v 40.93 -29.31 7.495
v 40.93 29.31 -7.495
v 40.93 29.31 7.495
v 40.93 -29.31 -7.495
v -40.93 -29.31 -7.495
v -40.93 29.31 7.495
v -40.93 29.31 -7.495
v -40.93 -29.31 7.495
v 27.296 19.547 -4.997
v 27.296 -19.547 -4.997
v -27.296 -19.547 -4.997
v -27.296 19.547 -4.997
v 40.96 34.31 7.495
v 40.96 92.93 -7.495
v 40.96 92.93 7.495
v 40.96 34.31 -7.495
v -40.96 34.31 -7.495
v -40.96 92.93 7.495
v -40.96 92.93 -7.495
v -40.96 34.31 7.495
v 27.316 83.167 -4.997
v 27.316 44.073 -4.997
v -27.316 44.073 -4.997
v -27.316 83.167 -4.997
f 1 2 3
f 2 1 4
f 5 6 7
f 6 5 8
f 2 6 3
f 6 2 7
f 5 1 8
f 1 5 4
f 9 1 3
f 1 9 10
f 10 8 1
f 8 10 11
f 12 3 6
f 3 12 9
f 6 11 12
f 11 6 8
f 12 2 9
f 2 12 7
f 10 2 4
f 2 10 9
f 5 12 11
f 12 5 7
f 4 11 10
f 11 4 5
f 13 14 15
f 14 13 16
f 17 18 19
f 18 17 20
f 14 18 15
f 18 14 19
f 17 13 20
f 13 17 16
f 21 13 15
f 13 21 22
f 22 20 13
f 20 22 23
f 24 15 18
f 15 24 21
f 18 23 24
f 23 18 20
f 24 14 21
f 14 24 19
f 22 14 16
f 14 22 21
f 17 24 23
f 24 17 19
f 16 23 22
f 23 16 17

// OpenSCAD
// file: doubleTaperBox.scad
// makes a double ended tapered cube.

module taper_cube(  big = [10, 20], 
                    small = [3, 6], 
                    height=15, 
                    indent_pct=10)
{
    difference()
    {
        cube ([ big.x, big.y, height],center=true);
        
        translate([0, 0, height/2])
        union ()
        {
            hull()
            {
                cube([ big.x, big.y, .01],center=true);
                translate([ 0, 0, -height])
                cube ([ small.x, small.y, .01],center=true);
            }
        }

        indent = height * indent_pct/100;
        translate([0, 0, -height/2 + indent])
        union ()
        {
            #hull()
            {
                cube ([ small.x, small.y, .01],center=true);
                translate([ 0, 0, -indent])
                cube([ big.x, big.y, .01],center=true);
            }
        }

    }
}


//make_bar(10);
//make_drip([ 3*25.4 , 2*25.4]);
taper_cube(indent_pct=30);
// file: myTools-extended.scad
$fn = $preview ? 50 : 120;
//=================================================

//            W   D   H   TRANS         ROTATE  btm top               
cylinder1 = [ +3, 20, 30, [0,0,0], [0,0,0],  0, 1 ]; // dia, len, translate[x,y,z]

// W=0 solid cylinder
cylinderX = [ 0, 20, 30, [0,40,0], [0,0,0],  0, 1 ]; // dia, len, translate[x,y,z]

//cylinder1 = [ +3, 20, 30, [0,0,0],      [0,0,0],  0, 0 ]; // dia, len, translate[x,y,z]
cylinder2 = [ -3, 20, 30, [0,40,0],     [0,0,0],  0, 1 ]; // dia, len, translate[x,y,z]

//cylinder2 = [ 4, 20, 30, [100,0,10/2], [0,0,0],   1, 0 ]; // dia, len, translate[x,y,z]
cylinder3 = [ 3, 55, 66, [-30,0,0],    [0,0,0],   0, 1 ]; // dia, len, translate[x,y,z]
cylinder4 = [ 3, 20, 30, [-100,0,10/2],[0,-90,0], 0, 1 ]; // dia, len, translate[x,y,z]

cylinder5 = [ 3, 55, 66, [ 0,30,0],     [0,0,0],   1, 0 ]; // dia, len, translate[x,y,z]

cylinder7 = [ 3, 20, 30, [ 0,100, 10/2],[0,-90,0], 1, 0 ]; // dia, len, translate[x,y,z]
cylinder8 = [ 3, 55, 66, [ 0,-30,0],    [0,0,0],   0, 1 ]; // dia, len, translate[x,y,z]
cylinder9 = [ 3, 30, [ 0,-100,10/2],[0,-90,0], 0, 1 ]; // dia, len, translate[x,y,z]

//       thick     dims           trans       rotate    left, right
box1 = [  3, [ 10, 20, 30] , [  30, 0, 0 ], [ 0, 0, 0 ],  0, 0];
box2 = [ -3, [ 10, 20, 30] , [  45, 0, 0 ], [ 0, 0, 0 ],  1, 0];
box3 = [ -3, [ 10, 20, 30] , [  60, 0, 0 ], [ 0, 0, 0 ],  0, 1];
box4 = [  3, [ 10, 20, 30] , [   0, 0, 0 ], [ 0, 0, 0 ],  1, 1];
// thick = 0 make solid
boxX = [  0, [ 10, 20, 30] , [  45, 0, 0 ], [ 0, 0, 0 ],  1, 0];


CYLINDER_LIST =[cylinder1, cylinderX];//, cylinder2];// [cylinder1, cylinder2]; //, cylinder3, cylinder4, cylinder5, cylinder6, cylinder7, cylinder8 ]; 
BOX_LIST=[boxX];
//, box2, box3]; //, box2, box3, box4]; //, box2];

module make_cubes(action, PARTS_LIST)
{
    BOX_THICK=0;
    BOX_DIMS=1;
    BOX_TRANS=2;
    BOX_ROTATE=3;
    BOX_ENDCAP_L=4;
    BOX_ENDCAP_R=5;
    
    echo ("DOIT (make_cubes): ", action);
        
    num_items =  len(PARTS_LIST);
    
    if (num_items)
    {
        if (action == "BOM")
        {
            // for each work object, execute the cmd on the object
            // the command is specified on the line after this BOM caller
            for(i=[0:1:$children-1])
               children(i); // do the shapes that come after us!
        }
        
        else if (action == "ADD")
        {
            echo ("start add cubes ------------------");
            for ( item = [ 0: num_items -1 ])
            {
                echo ("add item ", item);
                THICK = PARTS_LIST[item][BOX_THICK] * 2;
                GLP1 = [ THICK, THICK , 0];  // z walls done later.
                
                // thick > 0 dims = inside dimension ... add walls on ADD
                // thick < 0 dims = outside dimension ... just use dim
                CUBE = (THICK > 0) ? PARTS_LIST[item][BOX_DIMS] + GLP1 
                                   : PARTS_LIST[item][BOX_DIMS];
                
                echo ("item = ", item);
                echo ("usr dim = ", PARTS_LIST[item][BOX_DIMS]);
                echo ("wall thick = ", THICK/2);
                echo ("new dims = ", CUBE);
                
                translate( PARTS_LIST[item][BOX_TRANS])
                rotate( PARTS_LIST[item][BOX_ROTATE]) // user override
     
                // if WIDTH>0 walls grow outwards from DIM
                if ($preview)
                    %cube( CUBE, center=true);
                else
                    cube( CUBE, center=true);
            }

            echo ("end add cubes ------------------");
            echo ("");
        }
        else if (action == "REMOVE")
        {
            echo ("start removing cubes ------------------");

            num_items =  len(PARTS_LIST)-1;
            for ( item = [ 0: num_items ])
            {
               echo ("remove cube ", item);

                THICK = PARTS_LIST[item][BOX_THICK];
                if (THICK)
                {
                    GLP1 = [ THICK *2 , THICK*2 , 0];  // z walls done later.

                    //thick < 0 dims = outside dimension ... make walls
                    //thick > 0 dims = inside dimension of hole
                    CUBE = PARTS_LIST[item][BOX_DIMS]; 
                   
                    newW = (PARTS_LIST[item][BOX_ENDCAP_L] + PARTS_LIST[item][BOX_ENDCAP_R]) * THICK;

                    echo ("item = ", item);
                    echo ("endcapL = ",PARTS_LIST[item][BOX_ENDCAP_L]);
                    echo ("endcapR = ",PARTS_LIST[item][BOX_ENDCAP_R]);
                    echo ("newW = ", newW);
                   
                    // div 2, we are working with centered items.
                    punch = ((PARTS_LIST[item][BOX_ENDCAP_R] - PARTS_LIST[item][BOX_ENDCAP_L]) * THICK);
                    echo ("punch = ", punch);

                    // thick>0 wall grows out from DIM 
                    // thick<0 wall grow in from dim. 
                    A_CUBE = (THICK > 0) ? CUBE : CUBE + GLP1;
                    
                    //NEW_CUBE = A_CUBE;
                    NEW_CUBE = [ A_CUBE.x, A_CUBE.y, (punch ==0) ? A_CUBE.z: A_CUBE.z - abs(punch/4)];
                                 
                    echo ("remove: usr dims = ", PARTS_LIST[item][BOX_DIMS]);
                    echo ("remove: final dims = ", NEW_CUBE);   
                        
                    if ($preview)
                    {
                        // apply encap walls 
                        translate ([ 0, 0, -punch/4,]) // remember were on center /2 

                        // now do user PARTS_LIST
                        translate( PARTS_LIST[item][BOX_TRANS])
                        rotate( PARTS_LIST[item][BOX_ROTATE]) // user override
                        
                        #cube( [NEW_CUBE.x, 
                                NEW_CUBE.y,
                                NEW_CUBE.z],
                               center=true);
                    }
                    else
                    {
                        // apply encap walls 
                        translate ([ 0, 0, punch/4]) // remember were on center /2 

                        // now do user PARTS_LIST
                        translate( PARTS_LIST[item][BOX_TRANS])
                        rotate( PARTS_LIST[item][BOX_ROTATE]) // user override
                        
                        cube( [NEW_CUBE.x, 
                                NEW_CUBE.y,
                                NEW_CUBE.z],
                               center=true);
                    }
                }
                else
                {
                    echo ("THICK=0 object will be solid");
                }
            }
            echo ("end remove cubes ------------------");
        }
        else
            assert(0);   
    }
    else
    {
        echo ("NOTE: (make_cubes) no parts in parts list");
    }
    
}
//---------------------------------------------------------------------------    
module make_cylinders(action, PARTS_LIST)
{

//            D   H   TRANS         ROTATE   endcap endcap               
    CYL_THICK=0;
    CYL_DIA=1;
    CYL_HEIGHT=2;
    CYL_TRANS=3;
    CYL_ROTATE=4;
    CYL_ENDCAPL=5;
    CYL_ENDCAPR=6;

    echo ("DOIT (make_cylinders): ", action);
    
    num_items =  len(PARTS_LIST);
    if (num_items > 0)
    {
        if (action == "BOM")
        {
            // for each work object, execute the cmd on the object
            // the command is specified on the line after this PARTS_LIST caller
            for(i=[0:1:$children-1])
               children(i); // do the shapes that come after us!
        }
        
        else if (action == "ADD")
        {
            echo ("start add cylinders ------------------");
            for ( item = [ 0: num_items-1])
            {
                echo ("");
                echo ("add item ", item);
                THICK = PARTS_LIST[item][CYL_THICK];  // diameter speak.
                DIA = PARTS_LIST[item][CYL_DIA];

                newDIA = (THICK > 0) ? DIA + THICK*2 : DIA;
 
                height =  PARTS_LIST[item][CYL_HEIGHT];
                echo ("height = ", PARTS_LIST[item][CYL_HEIGHT]);
                echo ("thick = ", THICK);
                echo ("usr dia = ", PARTS_LIST[item][CYL_DIA]);
                echo ("newDIA = ", newDIA);

                translate( PARTS_LIST[item][CYL_TRANS])
                rotate( PARTS_LIST[item][CYL_ROTATE]) // user override
                #cylinder( d= newDIA, h = height, center=true);
                
            }
            echo ("----- end adding cylinders ------");
            echo ("");
        }
        else if (action == "REMOVE")
        {
            // make remove surface visable when previewing
            DEBUG = $preview ? 1 : 0;
            
            echo ("start remove cylinders ------------------");
            num_items =  len(PARTS_LIST)-1;
            for ( item = [ 0: num_items ])
            {
               echo ("remove cylinder -------- #", item);
             
               THICK = PARTS_LIST[item][CYL_THICK];  // diameter speak.
               if (THICK)
                {
                    echo ("item = ", item);
                    echo ("endcapL = ",PARTS_LIST[item][CYL_ENDCAPL]);
                    echo ("endcapR = ",PARTS_LIST[item][CYL_ENDCAPR]);

                   // reduce height when punching by the wall thickness of each endcap
                    height = DEBUG * .01 + PARTS_LIST[item][CYL_HEIGHT]
                             - (PARTS_LIST[item][CYL_ENDCAPL] + PARTS_LIST[item][CYL_ENDCAPR]) * abs(THICK);
                    echo ("orig H = ", PARTS_LIST[item][CYL_HEIGHT]);
                    echo ("new H = ", height);
                   
                    punch = (PARTS_LIST[item][CYL_ENDCAPL] - PARTS_LIST[item][CYL_ENDCAPR])* THICK/2;
                    echo ("punch = ", punch,"\n");
                 

                    echo ("THICK = ", THICK);
                    echo ("DIA = ", PARTS_LIST[item][CYL_DIA]);
                    newDIA = (THICK > 0) ? PARTS_LIST[item][CYL_DIA]: PARTS_LIST[item][CYL_DIA] + THICK*2;
                    echo ("newDIA = ", newDIA);
                    
                    if ($preview)
                    {
                        // apply encap walls 
                        translate ([ 0, 0, -punch]) // remember were on center /2 

                        // now do user PARTS_LIST
                        translate( PARTS_LIST[item][CYL_TRANS])
                        rotate( PARTS_LIST[item][CYL_ROTATE]) // user override
                        
                        %cylinder( d= newDIA, h = height, center=true);
                    }
                    else
                    {
                        // apply encap walls 
                        translate ([ 0, 0, -punch]) // remember were on center /2 

                        // now do user PARTS_LIST
                        translate( PARTS_LIST[item][CYL_TRANS])
                        rotate( PARTS_LIST[item][CYL_ROTATE]) // user override
                        
                        cylinder( d= newDIA, h = height, center=true);
                    }
                }
                else
                {
                    echo ("THICK = 0 object will be solid");
                }
                
            }
            echo ("----- end removing cylinders ------\n");
        }
        else
            assert(0);   
    }
    else
    {
        echo ("NOTE: (make_cylinders) no parts in parts list");
    }
       
}
//77777777777777777777777777


//------------------------------------------------------------
module testx()
{
    difference()
    {
        union()
        {
            make_cubes("BOM", PARTS_LIST=BOX_LIST)
              make_cubes("ADD", PARTS_LIST=BOX_LIST);
              
            make_cylinders("BOM", PARTS_LIST=CYLINDER_LIST)
              make_cylinders("ADD", PARTS_LIST=CYLINDER_LIST);
        }
        
        union()
        {
          make_cubes("BOM", PARTS_LIST=BOX_LIST)
            make_cubes("REMOVE", PARTS_LIST=BOX_LIST);
            
          make_cylinders("BOM", PARTS_LIST=CYLINDER_LIST)
            make_cylinders("REMOVE", PARTS_LIST=CYLINDER_LIST);
          
          // cutaway view
          translate([0,0,-50]) cube([100,100,100]);
        }
    } 
}

testx();
// main file
use <myTools-extended.scad>
use <doubleTaperBox.scad>

$fn = $preview ? 50 : 120;

//DEBUG= $preview ? 0 : 1;
DEBUG= 1;
//=================================================

TWEAK = 1;
WHITE_W = 80.86 + TWEAK;
WHITE_L = 57.62 + TWEAK;

BLACK_W = 80.92 + TWEAK;
BLACK_L = 57.62 + TWEAK;

THICK=4;
PIPE_LEN = 9 * 25.4;
BOX_LEN = 6 * 25.4;

A = WHITE_W * WHITE_L; //square inches of down pipe

TRUE_DIA = (2 * sqrt( A /PI));
PIPE_iDIA = round( TRUE_DIA + 10);  // round up to nearest 10mm

//ringSupport
RING_HEIGHT=10;
RING_WIDTH=20;

echo ("pipe AREA = ", A, "sq mm");
echo ("pipe PIPE_iDIA = ", PIPE_iDIA,"mm");

SCREW_DIA= 3/16 * 25.4;

function AVG(a,b) = (a+b)/2;

//              T         D           H           TRANS     ROTATE   endcap endcap               
cylinder1 = [ THICK,     PIPE_iDIA,  PIPE_LEN,     [0,0,0], [0,0,0],  DEBUG, DEBUG ]; // dia, len, translate[x,y,z]

screw1 =    [ SCREW_DIA, SCREW_DIA*2, WHITE_W-THICK * 16/4, [115, -(BLACK_W/4 - THICK*3/2), (PIPE_LEN)/2], [90,0,0], 0, 0 ]; // dia, len, translate[x,y,z]
screw2 =    [ SCREW_DIA, SCREW_DIA*2, BLACK_W-THICK * 16/4, [115,  (BLACK_W/4 - THICK*3/2), -(PIPE_LEN)/2], [90,0,0], 0, 0 ]; // dia, len, translate[x,y,z]


//         T        DIM              TRANS                                                     ROTATE      L  R                  
white = [THICK, [ WHITE_W, WHITE_L, BOX_LEN] ,
        [   (BOX_LEN/2 - THICK), 
            (PIPE_iDIA/4 - THICK*2), 
            (-PIPE_LEN/2 + WHITE_L - THICK*3 - THICK * 27/64)
        ], 
        [ 0, 90, 0 ], 0, 0];
        
black = [THICK, [ BLACK_W, BLACK_L, BOX_LEN] , 
        [   (BOX_LEN/2 - THICK),
            -(PIPE_iDIA/4 - THICK*2),
            -(-PIPE_LEN/2 +BLACK_L/2 + THICK*3 +THICK * 59/64)],
        [ 0, 90, 0 ], 0, 0];

// make supports so prusa supports are not needed.
support1 = [-2, [ WHITE_W-.5, WHITE_L-.5, PIPE_LEN] , [ -BLACK_W/2, 0, PIPE_LEN/2],    [ 0, 0, 0 ], 0, 0];
support2 = [-2, [ BLACK_W-.5, BLACK_L-.5, PIPE_LEN] , [  BLACK_W/2+3, 0, PIPE_LEN/2], [ 0, 0, 0 ], 0, 0];


C_LIST = [cylinder1]; //, screw1, screw2]; //, cylinder3, cylinder4, cylinder5, cylinder6, cylinder7, cylinder8 ]; 
BOX_LIST=[white, black]; //[white, black];

SUPPORT_LIST=[support1]; // both are almost the same.
//------------------------------------------------------------
module make_drains()
{
    difference()
    {
        {
            difference()
            {
                union()
                {
                  #make_cylinders(action="BOM", PARTS_LIST=C_LIST)
                    make_cylinders(action="ADD", PARTS_LIST=C_LIST);
                    //
                  make_cubes("BOM", PARTS_LIST=BOX_LIST)
                    make_cubes("ADD", PARTS_LIST=BOX_LIST);
                }

              union()
              {
                  make_cylinders("BOM", PARTS_LIST=C_LIST)
                    make_cylinders("REMOVE", PARTS_LIST=C_LIST);

                  make_cubes("BOM", PARTS_LIST=BOX_LIST)
                    make_cubes("REMOVE", PARTS_LIST=BOX_LIST);
              }
            }
       }
       // trim ends to make flat
       // translate([0, 0,  (PIPE_LEN*2/3+ 20.)]) #cube([400,100,10], center=true);
       // translate([0, 0, -(PIPE_LEN*2/3+ 20)]) #cube([400,100,10], center=true);
    }
}
//-------------------------------------------------------

module make_supports()
{
    difference()
    {
        union()
        {
          make_cubes("BOM", PARTS_LIST=SUPPORT_LIST)
            make_cubes("ADD", PARTS_LIST=SUPPORT_LIST);
        }

      union()
      {
          make_cubes("BOM", PARTS_LIST=SUPPORT_LIST)
            make_cubes("REMOVE", PARTS_LIST=SUPPORT_LIST);
      }
    }
}
// -----------------------------------------------
module make_rings()
{
    //               WALL                 PIPE_iDIA      WIDE
    outside =   [ RING_HEIGHT,  // make bigger by this dia
                  PIPE_iDIA + THICK ,  // sit on outside of pipe
                  RING_WIDTH/2,   // fatness of ring
                  [0,0,0], [0,0,0],  DEBUG, DEBUG ];
                  
    seat =      [   THICK+.5,
                    PIPE_iDIA,   // start halfway on pipe dia
                    RING_WIDTH,
                    [0,0,RING_WIDTH/2],
                    [0,0,0],  DEBUG, DEBUG ];
     
    OUTER = [ outside];
    SEAT =  [ seat];
        translate([0, 0, RING_HEIGHT/2])
        difference()
        {
            union()
            {
              make_cylinders(action="BOM", PARTS_LIST=OUTER)
                make_cylinders(action="ADD", PARTS_LIST=OUTER);
/*
                make_cylinders("BOM", PARTS_LIST=SEAT);
                make_cylinders("ADD", PARTS_LIST=SEAT);
*/
            }

          union()
          {
              make_cylinders("BOM", PARTS_LIST=OUTER)
                make_cylinders("REMOVE", PARTS_LIST=OUTER);

if(1)
{                
              make_cylinders("BOM", PARTS_LIST=SEAT);
                make_cylinders("ADD", PARTS_LIST=SEAT);
}

             #cylinder(h=150, d= PIPE_iDIA, center = true);

          }
     }
    
}

// -----------------------------------------------
module make_shroud(FAT=.5)
{
    PIPE_OD=PIPE_iDIA + 2 * THICK;
    
    //               WALL                 PIPE_iDIA      WIDE
    outside =   [ RING_HEIGHT,   
                  PIPE_OD + RING_HEIGHT + FAT, // sit on outside of pipe
                  RING_WIDTH*2,                // fatness of ring
                  [0,0,0], [0,0,0],  DEBUG, DEBUG ];

    // yes thick/2 is a unknnown tweak.
    seat =   [    RING_HEIGHT + FAT - THICK/2, // make bigger by this dia
                  PIPE_OD + FAT,               // sit on outside of pipe
                  RING_WIDTH + FAT*2,          // punch depth
                  [0,0,0], [0,0,0],  DEBUG, DEBUG ];
                  
    EAR_SIZE = 20;                
    //       thick     dims           trans       rotate    left, right
    box1 = [  0,    //solid, zero walls 
            [   PIPE_iDIA + THICK*2 + 2*RING_HEIGHT + EAR_SIZE*2.5,
                20,
                RING_WIDTH *2], 
            [  0, 0, 0 ], 
            [ 0, 0, 0 ],
            0, 0];
            
    EARS = [ box1];
     
    OUTER = [ outside];
    INNER =  [ seat];
    
        difference()
        {
            union()
            {
                make_cylinders(action="BOM", PARTS_LIST=OUTER)
                    make_cylinders(action="ADD", PARTS_LIST=OUTER);
                make_cubes("BOM", PARTS_LIST=EARS);
                    make_cubes("ADD", PARTS_LIST=EARS);
            }

          union()
          {
              make_cylinders("BOM", PARTS_LIST=OUTER)
                make_cylinders("REMOVE", PARTS_LIST=OUTER);

              make_cylinders("BOM", PARTS_LIST=INNER);
                make_cylinders("ADD", PARTS_LIST=INNER);

            // crazy glue drip stop
            {
                translate([ PIPE_iDIA/2 + THICK*5  , 0, 0])
                rotate([ 0, 0, 90])
                #cylinder(h=170, d= 3, center = true);

                translate([ -(PIPE_iDIA/2 + THICK*5 ), 0, 0])
                rotate([ 0, 0, 90])
                #cylinder(h=150, d= 3, center = true);
            }

            // backup bolt holes
            {
                BOLT = 3/16 * 25.4 + FAT;
                translate([ PIPE_iDIA/2 + THICK*7.5  , 0, 0])
                rotate([ 0, 90, 90])
                #cylinder(h=170, d= BOLT, center = true);

                translate([ -(PIPE_iDIA/2 + THICK*7.5 ), 0, 0])
                rotate([ 0, 90, 90])
                #cylinder(h=150, d= BOLT, center = true);
            }


            // basic pipe OUTER dia cutout
             cylinder(h=150, d= PIPE_OD+FAT , center = true);
            
            if (0) // transparent view
            {
                 translate([0,0,25])
                 cube([200, 200, 50], center=true);
            }
          }
     }
    
}

module make_buttplugs()
{
    taper_cube(  big =  [WHITE_W, WHITE_L], 
                 small= [WHITE_W * .6, WHITE_L *.6], 
                 height=15, 
                 indent_pct=20);
                 
    translate([0, WHITE_L + 5, 0])
    taper_cube(  big =  [BLACK_W, BLACK_L], 
                 small= [BLACK_W * .6, BLACK_L *.6], 
                 height=15, 
                 indent_pct=20);

 }
//make_drains();
//make_supports();
//make_rings();
//make_shroud(.5);
make_buttplugs();
